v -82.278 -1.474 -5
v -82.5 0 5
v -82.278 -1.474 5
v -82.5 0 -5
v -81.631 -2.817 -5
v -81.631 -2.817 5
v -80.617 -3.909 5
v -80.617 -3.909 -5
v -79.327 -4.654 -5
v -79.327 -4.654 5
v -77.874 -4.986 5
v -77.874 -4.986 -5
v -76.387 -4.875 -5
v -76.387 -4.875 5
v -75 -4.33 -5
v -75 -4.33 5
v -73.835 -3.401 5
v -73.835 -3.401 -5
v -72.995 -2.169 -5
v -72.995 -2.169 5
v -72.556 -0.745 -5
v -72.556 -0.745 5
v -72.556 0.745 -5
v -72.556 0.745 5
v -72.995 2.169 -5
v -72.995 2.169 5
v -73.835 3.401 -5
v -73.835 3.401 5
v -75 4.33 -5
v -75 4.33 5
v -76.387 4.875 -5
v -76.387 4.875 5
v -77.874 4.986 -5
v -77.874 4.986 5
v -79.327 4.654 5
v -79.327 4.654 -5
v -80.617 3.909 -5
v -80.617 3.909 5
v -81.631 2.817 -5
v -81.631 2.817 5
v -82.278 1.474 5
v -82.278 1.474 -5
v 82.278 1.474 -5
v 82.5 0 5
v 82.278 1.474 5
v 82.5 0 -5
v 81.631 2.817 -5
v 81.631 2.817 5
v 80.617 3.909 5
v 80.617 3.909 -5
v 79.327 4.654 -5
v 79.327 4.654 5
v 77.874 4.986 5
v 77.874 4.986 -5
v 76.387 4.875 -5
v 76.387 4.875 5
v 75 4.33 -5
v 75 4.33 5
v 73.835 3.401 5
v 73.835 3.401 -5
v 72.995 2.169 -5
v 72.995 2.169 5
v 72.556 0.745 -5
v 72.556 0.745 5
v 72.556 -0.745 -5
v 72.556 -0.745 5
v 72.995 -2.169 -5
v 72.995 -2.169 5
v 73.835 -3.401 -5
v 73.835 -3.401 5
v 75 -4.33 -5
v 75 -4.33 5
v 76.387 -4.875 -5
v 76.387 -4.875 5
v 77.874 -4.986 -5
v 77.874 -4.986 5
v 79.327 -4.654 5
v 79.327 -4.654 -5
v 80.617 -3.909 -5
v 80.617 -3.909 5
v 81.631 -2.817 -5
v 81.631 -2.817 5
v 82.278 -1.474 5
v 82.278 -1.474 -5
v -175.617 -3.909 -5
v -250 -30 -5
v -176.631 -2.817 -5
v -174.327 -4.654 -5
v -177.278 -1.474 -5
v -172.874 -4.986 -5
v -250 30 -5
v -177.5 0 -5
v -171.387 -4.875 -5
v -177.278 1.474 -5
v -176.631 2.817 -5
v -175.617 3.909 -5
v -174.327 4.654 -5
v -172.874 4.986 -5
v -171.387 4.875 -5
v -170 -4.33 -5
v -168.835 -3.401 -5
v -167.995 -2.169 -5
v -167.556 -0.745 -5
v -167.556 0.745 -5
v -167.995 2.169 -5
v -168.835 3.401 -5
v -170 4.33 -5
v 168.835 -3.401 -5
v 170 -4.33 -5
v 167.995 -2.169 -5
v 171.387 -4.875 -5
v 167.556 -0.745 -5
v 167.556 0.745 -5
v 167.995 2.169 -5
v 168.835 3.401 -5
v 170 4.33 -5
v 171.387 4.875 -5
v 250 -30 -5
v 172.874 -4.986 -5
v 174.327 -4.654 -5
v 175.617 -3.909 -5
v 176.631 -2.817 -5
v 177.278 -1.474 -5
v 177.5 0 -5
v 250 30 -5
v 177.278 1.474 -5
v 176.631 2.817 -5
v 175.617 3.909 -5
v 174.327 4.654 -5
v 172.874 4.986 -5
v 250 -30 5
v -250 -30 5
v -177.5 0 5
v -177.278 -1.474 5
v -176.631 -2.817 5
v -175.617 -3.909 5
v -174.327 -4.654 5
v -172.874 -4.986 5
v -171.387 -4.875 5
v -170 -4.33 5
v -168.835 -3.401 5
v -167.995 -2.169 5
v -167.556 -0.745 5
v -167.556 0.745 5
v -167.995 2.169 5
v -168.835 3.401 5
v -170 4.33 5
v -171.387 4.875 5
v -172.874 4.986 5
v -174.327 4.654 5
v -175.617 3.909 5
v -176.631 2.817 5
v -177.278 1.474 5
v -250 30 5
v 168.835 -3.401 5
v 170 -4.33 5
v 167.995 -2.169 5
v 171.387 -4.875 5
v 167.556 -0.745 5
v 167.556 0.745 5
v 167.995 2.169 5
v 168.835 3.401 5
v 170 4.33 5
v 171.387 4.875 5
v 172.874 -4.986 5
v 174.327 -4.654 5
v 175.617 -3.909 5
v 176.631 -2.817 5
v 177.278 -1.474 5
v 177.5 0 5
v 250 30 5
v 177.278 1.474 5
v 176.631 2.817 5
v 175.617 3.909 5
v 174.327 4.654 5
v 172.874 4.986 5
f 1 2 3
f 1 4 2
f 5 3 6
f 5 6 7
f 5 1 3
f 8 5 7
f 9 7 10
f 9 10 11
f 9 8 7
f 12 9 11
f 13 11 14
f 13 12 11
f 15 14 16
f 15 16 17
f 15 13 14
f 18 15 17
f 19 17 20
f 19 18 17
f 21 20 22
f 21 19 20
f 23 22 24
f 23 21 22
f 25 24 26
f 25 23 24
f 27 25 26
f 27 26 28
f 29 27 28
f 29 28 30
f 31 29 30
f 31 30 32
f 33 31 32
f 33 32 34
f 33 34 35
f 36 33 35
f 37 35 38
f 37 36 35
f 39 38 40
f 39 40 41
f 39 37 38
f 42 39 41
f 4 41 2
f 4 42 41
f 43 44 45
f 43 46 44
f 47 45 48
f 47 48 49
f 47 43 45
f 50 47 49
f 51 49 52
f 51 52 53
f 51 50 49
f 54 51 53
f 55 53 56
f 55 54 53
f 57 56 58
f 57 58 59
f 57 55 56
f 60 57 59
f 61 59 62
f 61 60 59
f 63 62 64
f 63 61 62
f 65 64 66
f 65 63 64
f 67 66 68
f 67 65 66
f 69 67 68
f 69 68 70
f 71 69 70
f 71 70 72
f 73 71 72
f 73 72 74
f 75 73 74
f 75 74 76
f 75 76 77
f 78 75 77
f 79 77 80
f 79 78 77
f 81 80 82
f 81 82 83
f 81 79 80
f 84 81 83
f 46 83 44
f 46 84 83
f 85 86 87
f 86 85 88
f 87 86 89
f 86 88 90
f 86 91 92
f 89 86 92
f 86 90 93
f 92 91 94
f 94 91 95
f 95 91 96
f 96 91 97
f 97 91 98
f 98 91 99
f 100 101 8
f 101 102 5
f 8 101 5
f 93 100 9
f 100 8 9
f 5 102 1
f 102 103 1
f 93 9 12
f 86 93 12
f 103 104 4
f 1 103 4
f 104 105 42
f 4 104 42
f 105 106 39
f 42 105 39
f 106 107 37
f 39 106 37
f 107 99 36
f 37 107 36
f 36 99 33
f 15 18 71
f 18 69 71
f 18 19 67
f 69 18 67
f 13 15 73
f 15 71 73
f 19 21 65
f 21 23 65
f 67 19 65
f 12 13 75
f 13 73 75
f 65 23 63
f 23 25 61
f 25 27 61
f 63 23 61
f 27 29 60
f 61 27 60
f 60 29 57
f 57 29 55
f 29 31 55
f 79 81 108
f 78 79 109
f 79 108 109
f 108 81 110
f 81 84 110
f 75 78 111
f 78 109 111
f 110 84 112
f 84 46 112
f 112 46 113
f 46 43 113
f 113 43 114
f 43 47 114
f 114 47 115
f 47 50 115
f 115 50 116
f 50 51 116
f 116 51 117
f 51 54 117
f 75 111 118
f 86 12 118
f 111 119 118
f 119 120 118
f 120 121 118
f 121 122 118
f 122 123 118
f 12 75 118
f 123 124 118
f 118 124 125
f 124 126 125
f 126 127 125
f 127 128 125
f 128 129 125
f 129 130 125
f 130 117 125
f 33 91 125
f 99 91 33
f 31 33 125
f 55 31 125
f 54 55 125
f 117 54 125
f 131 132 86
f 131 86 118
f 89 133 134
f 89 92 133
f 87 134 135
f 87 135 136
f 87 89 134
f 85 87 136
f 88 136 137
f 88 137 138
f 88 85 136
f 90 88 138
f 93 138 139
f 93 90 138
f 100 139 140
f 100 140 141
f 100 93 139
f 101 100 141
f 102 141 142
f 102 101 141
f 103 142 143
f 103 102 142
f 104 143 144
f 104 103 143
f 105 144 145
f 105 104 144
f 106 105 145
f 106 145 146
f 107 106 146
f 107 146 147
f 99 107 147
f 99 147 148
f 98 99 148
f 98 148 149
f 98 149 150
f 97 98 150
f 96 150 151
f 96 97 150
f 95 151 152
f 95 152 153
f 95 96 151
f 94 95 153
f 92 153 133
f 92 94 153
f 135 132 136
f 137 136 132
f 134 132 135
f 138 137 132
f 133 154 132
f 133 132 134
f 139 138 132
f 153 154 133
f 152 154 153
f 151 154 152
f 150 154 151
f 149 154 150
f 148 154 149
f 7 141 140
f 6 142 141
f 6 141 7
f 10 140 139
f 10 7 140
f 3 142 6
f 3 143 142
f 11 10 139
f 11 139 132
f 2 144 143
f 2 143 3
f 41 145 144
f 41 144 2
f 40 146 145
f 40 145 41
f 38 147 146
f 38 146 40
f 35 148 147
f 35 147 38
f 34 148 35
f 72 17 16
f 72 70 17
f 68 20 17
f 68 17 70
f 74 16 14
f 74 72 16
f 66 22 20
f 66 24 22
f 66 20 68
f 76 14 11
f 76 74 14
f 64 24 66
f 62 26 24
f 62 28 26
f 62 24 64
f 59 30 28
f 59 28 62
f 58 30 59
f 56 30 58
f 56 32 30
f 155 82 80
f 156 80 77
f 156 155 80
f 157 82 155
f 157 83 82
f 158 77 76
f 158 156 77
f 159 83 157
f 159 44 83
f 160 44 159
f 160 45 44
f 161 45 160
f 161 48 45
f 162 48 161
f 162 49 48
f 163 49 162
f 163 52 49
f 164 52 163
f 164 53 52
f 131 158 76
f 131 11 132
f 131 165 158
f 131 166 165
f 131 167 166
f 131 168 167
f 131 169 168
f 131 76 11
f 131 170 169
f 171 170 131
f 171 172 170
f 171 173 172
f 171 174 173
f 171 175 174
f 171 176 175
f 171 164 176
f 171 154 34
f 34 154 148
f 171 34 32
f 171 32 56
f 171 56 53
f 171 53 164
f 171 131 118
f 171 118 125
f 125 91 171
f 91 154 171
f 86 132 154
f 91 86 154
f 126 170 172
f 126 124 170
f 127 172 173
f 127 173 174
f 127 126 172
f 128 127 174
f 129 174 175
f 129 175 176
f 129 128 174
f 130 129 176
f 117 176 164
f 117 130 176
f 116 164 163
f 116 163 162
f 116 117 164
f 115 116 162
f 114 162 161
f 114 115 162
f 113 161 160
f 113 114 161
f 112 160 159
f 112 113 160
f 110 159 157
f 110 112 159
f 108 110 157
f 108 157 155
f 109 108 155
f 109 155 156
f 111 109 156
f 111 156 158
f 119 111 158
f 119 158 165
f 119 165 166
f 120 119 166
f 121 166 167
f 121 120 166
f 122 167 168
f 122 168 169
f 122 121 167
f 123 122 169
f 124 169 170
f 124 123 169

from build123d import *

# Parameters (mm, degrees)
SKETCH1_W           = 500
SKETCH1_H           = 60
SKETCH1_R           = 5
BOSS_EXTRUDE1_DEPTH = 5


with BuildPart() as part:
    # Sketch1 → Boss-Extrude1 (new, symmetric)
    with BuildSketch(Plane.XY):
        Rectangle(SKETCH1_W, SKETCH1_H)
        with Locations((172.5, 0)):
            Circle(SKETCH1_R, mode=Mode.SUBTRACT)
        with Locations((77.5, 0)):
            Circle(SKETCH1_R, mode=Mode.SUBTRACT)
        with Locations(Location((-172.5, 0, 0), (0, 0, 180))):
            Circle(SKETCH1_R, mode=Mode.SUBTRACT)
        with Locations(Location((-77.5, 0, 0), (0, 0, 180))):
            Circle(SKETCH1_R, mode=Mode.SUBTRACT)
    extrude(amount=BOSS_EXTRUDE1_DEPTH, both=True)


solid = part.part
